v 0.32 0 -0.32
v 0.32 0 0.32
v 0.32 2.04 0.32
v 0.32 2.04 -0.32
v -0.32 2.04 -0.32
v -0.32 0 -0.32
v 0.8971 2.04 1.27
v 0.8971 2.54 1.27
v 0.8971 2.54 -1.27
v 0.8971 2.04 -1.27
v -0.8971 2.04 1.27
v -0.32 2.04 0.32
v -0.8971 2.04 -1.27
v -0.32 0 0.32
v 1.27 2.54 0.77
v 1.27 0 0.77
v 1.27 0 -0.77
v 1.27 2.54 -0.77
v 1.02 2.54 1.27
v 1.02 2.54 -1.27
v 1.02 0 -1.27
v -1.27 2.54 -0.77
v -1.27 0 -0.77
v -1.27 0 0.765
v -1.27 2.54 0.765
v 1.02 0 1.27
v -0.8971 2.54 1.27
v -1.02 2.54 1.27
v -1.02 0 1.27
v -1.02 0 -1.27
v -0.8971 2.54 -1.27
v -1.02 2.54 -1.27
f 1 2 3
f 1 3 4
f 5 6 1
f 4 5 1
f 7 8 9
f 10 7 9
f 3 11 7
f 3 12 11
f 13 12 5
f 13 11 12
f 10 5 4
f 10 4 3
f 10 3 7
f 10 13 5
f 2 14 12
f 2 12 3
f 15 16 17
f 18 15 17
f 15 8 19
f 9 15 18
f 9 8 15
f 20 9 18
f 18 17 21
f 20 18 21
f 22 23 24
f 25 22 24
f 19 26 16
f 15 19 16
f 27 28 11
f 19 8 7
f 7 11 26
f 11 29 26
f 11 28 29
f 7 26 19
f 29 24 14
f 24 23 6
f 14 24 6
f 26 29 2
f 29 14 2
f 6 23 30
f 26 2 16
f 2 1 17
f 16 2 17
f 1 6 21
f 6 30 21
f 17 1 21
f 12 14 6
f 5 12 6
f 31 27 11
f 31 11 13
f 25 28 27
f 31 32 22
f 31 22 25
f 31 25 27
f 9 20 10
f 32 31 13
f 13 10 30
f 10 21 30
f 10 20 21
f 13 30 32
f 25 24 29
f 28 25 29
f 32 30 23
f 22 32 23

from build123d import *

# Parameters (mm, degrees)
SKETCH1_W           = 0.64
SKETCH1_H           = 0.64
BOSS_EXTRUDE1_DEPTH = 2.54
SKETCH3_W           = 1.79428953
SKETCH3_H           = 2.54
CUT_EXTRUDE1_DEPTH  = 0.5


with BuildPart() as part:
    # Sketch1 → Boss-Extrude1 (new body)
    with BuildSketch(Plane(origin=(0, 0, 0), x_dir=(1, 0, 0), z_dir=(0, 1, 0))):
        Polygon((-1.02, 1.27), (-1.27, 0.77), (-1.27, -0.765040333), (-1.02, -1.27), (1.02, -1.27), (1.27, -0.77), (1.27, 0.77), (1.02, 1.27), align=None)
        Rectangle(SKETCH1_W, SKETCH1_H, mode=Mode.SUBTRACT)
    extrude(amount=BOSS_EXTRUDE1_DEPTH)

    # Sketch3 → Cut-Extrude1 (cut)
    with BuildSketch(Plane(origin=(0, 2.54, 0), x_dir=(1, 0, 0), z_dir=(0, 1, 0))):
        Rectangle(SKETCH3_W, SKETCH3_H)
    extrude(amount=-CUT_EXTRUDE1_DEPTH, mode=Mode.SUBTRACT)


solid = part.part
